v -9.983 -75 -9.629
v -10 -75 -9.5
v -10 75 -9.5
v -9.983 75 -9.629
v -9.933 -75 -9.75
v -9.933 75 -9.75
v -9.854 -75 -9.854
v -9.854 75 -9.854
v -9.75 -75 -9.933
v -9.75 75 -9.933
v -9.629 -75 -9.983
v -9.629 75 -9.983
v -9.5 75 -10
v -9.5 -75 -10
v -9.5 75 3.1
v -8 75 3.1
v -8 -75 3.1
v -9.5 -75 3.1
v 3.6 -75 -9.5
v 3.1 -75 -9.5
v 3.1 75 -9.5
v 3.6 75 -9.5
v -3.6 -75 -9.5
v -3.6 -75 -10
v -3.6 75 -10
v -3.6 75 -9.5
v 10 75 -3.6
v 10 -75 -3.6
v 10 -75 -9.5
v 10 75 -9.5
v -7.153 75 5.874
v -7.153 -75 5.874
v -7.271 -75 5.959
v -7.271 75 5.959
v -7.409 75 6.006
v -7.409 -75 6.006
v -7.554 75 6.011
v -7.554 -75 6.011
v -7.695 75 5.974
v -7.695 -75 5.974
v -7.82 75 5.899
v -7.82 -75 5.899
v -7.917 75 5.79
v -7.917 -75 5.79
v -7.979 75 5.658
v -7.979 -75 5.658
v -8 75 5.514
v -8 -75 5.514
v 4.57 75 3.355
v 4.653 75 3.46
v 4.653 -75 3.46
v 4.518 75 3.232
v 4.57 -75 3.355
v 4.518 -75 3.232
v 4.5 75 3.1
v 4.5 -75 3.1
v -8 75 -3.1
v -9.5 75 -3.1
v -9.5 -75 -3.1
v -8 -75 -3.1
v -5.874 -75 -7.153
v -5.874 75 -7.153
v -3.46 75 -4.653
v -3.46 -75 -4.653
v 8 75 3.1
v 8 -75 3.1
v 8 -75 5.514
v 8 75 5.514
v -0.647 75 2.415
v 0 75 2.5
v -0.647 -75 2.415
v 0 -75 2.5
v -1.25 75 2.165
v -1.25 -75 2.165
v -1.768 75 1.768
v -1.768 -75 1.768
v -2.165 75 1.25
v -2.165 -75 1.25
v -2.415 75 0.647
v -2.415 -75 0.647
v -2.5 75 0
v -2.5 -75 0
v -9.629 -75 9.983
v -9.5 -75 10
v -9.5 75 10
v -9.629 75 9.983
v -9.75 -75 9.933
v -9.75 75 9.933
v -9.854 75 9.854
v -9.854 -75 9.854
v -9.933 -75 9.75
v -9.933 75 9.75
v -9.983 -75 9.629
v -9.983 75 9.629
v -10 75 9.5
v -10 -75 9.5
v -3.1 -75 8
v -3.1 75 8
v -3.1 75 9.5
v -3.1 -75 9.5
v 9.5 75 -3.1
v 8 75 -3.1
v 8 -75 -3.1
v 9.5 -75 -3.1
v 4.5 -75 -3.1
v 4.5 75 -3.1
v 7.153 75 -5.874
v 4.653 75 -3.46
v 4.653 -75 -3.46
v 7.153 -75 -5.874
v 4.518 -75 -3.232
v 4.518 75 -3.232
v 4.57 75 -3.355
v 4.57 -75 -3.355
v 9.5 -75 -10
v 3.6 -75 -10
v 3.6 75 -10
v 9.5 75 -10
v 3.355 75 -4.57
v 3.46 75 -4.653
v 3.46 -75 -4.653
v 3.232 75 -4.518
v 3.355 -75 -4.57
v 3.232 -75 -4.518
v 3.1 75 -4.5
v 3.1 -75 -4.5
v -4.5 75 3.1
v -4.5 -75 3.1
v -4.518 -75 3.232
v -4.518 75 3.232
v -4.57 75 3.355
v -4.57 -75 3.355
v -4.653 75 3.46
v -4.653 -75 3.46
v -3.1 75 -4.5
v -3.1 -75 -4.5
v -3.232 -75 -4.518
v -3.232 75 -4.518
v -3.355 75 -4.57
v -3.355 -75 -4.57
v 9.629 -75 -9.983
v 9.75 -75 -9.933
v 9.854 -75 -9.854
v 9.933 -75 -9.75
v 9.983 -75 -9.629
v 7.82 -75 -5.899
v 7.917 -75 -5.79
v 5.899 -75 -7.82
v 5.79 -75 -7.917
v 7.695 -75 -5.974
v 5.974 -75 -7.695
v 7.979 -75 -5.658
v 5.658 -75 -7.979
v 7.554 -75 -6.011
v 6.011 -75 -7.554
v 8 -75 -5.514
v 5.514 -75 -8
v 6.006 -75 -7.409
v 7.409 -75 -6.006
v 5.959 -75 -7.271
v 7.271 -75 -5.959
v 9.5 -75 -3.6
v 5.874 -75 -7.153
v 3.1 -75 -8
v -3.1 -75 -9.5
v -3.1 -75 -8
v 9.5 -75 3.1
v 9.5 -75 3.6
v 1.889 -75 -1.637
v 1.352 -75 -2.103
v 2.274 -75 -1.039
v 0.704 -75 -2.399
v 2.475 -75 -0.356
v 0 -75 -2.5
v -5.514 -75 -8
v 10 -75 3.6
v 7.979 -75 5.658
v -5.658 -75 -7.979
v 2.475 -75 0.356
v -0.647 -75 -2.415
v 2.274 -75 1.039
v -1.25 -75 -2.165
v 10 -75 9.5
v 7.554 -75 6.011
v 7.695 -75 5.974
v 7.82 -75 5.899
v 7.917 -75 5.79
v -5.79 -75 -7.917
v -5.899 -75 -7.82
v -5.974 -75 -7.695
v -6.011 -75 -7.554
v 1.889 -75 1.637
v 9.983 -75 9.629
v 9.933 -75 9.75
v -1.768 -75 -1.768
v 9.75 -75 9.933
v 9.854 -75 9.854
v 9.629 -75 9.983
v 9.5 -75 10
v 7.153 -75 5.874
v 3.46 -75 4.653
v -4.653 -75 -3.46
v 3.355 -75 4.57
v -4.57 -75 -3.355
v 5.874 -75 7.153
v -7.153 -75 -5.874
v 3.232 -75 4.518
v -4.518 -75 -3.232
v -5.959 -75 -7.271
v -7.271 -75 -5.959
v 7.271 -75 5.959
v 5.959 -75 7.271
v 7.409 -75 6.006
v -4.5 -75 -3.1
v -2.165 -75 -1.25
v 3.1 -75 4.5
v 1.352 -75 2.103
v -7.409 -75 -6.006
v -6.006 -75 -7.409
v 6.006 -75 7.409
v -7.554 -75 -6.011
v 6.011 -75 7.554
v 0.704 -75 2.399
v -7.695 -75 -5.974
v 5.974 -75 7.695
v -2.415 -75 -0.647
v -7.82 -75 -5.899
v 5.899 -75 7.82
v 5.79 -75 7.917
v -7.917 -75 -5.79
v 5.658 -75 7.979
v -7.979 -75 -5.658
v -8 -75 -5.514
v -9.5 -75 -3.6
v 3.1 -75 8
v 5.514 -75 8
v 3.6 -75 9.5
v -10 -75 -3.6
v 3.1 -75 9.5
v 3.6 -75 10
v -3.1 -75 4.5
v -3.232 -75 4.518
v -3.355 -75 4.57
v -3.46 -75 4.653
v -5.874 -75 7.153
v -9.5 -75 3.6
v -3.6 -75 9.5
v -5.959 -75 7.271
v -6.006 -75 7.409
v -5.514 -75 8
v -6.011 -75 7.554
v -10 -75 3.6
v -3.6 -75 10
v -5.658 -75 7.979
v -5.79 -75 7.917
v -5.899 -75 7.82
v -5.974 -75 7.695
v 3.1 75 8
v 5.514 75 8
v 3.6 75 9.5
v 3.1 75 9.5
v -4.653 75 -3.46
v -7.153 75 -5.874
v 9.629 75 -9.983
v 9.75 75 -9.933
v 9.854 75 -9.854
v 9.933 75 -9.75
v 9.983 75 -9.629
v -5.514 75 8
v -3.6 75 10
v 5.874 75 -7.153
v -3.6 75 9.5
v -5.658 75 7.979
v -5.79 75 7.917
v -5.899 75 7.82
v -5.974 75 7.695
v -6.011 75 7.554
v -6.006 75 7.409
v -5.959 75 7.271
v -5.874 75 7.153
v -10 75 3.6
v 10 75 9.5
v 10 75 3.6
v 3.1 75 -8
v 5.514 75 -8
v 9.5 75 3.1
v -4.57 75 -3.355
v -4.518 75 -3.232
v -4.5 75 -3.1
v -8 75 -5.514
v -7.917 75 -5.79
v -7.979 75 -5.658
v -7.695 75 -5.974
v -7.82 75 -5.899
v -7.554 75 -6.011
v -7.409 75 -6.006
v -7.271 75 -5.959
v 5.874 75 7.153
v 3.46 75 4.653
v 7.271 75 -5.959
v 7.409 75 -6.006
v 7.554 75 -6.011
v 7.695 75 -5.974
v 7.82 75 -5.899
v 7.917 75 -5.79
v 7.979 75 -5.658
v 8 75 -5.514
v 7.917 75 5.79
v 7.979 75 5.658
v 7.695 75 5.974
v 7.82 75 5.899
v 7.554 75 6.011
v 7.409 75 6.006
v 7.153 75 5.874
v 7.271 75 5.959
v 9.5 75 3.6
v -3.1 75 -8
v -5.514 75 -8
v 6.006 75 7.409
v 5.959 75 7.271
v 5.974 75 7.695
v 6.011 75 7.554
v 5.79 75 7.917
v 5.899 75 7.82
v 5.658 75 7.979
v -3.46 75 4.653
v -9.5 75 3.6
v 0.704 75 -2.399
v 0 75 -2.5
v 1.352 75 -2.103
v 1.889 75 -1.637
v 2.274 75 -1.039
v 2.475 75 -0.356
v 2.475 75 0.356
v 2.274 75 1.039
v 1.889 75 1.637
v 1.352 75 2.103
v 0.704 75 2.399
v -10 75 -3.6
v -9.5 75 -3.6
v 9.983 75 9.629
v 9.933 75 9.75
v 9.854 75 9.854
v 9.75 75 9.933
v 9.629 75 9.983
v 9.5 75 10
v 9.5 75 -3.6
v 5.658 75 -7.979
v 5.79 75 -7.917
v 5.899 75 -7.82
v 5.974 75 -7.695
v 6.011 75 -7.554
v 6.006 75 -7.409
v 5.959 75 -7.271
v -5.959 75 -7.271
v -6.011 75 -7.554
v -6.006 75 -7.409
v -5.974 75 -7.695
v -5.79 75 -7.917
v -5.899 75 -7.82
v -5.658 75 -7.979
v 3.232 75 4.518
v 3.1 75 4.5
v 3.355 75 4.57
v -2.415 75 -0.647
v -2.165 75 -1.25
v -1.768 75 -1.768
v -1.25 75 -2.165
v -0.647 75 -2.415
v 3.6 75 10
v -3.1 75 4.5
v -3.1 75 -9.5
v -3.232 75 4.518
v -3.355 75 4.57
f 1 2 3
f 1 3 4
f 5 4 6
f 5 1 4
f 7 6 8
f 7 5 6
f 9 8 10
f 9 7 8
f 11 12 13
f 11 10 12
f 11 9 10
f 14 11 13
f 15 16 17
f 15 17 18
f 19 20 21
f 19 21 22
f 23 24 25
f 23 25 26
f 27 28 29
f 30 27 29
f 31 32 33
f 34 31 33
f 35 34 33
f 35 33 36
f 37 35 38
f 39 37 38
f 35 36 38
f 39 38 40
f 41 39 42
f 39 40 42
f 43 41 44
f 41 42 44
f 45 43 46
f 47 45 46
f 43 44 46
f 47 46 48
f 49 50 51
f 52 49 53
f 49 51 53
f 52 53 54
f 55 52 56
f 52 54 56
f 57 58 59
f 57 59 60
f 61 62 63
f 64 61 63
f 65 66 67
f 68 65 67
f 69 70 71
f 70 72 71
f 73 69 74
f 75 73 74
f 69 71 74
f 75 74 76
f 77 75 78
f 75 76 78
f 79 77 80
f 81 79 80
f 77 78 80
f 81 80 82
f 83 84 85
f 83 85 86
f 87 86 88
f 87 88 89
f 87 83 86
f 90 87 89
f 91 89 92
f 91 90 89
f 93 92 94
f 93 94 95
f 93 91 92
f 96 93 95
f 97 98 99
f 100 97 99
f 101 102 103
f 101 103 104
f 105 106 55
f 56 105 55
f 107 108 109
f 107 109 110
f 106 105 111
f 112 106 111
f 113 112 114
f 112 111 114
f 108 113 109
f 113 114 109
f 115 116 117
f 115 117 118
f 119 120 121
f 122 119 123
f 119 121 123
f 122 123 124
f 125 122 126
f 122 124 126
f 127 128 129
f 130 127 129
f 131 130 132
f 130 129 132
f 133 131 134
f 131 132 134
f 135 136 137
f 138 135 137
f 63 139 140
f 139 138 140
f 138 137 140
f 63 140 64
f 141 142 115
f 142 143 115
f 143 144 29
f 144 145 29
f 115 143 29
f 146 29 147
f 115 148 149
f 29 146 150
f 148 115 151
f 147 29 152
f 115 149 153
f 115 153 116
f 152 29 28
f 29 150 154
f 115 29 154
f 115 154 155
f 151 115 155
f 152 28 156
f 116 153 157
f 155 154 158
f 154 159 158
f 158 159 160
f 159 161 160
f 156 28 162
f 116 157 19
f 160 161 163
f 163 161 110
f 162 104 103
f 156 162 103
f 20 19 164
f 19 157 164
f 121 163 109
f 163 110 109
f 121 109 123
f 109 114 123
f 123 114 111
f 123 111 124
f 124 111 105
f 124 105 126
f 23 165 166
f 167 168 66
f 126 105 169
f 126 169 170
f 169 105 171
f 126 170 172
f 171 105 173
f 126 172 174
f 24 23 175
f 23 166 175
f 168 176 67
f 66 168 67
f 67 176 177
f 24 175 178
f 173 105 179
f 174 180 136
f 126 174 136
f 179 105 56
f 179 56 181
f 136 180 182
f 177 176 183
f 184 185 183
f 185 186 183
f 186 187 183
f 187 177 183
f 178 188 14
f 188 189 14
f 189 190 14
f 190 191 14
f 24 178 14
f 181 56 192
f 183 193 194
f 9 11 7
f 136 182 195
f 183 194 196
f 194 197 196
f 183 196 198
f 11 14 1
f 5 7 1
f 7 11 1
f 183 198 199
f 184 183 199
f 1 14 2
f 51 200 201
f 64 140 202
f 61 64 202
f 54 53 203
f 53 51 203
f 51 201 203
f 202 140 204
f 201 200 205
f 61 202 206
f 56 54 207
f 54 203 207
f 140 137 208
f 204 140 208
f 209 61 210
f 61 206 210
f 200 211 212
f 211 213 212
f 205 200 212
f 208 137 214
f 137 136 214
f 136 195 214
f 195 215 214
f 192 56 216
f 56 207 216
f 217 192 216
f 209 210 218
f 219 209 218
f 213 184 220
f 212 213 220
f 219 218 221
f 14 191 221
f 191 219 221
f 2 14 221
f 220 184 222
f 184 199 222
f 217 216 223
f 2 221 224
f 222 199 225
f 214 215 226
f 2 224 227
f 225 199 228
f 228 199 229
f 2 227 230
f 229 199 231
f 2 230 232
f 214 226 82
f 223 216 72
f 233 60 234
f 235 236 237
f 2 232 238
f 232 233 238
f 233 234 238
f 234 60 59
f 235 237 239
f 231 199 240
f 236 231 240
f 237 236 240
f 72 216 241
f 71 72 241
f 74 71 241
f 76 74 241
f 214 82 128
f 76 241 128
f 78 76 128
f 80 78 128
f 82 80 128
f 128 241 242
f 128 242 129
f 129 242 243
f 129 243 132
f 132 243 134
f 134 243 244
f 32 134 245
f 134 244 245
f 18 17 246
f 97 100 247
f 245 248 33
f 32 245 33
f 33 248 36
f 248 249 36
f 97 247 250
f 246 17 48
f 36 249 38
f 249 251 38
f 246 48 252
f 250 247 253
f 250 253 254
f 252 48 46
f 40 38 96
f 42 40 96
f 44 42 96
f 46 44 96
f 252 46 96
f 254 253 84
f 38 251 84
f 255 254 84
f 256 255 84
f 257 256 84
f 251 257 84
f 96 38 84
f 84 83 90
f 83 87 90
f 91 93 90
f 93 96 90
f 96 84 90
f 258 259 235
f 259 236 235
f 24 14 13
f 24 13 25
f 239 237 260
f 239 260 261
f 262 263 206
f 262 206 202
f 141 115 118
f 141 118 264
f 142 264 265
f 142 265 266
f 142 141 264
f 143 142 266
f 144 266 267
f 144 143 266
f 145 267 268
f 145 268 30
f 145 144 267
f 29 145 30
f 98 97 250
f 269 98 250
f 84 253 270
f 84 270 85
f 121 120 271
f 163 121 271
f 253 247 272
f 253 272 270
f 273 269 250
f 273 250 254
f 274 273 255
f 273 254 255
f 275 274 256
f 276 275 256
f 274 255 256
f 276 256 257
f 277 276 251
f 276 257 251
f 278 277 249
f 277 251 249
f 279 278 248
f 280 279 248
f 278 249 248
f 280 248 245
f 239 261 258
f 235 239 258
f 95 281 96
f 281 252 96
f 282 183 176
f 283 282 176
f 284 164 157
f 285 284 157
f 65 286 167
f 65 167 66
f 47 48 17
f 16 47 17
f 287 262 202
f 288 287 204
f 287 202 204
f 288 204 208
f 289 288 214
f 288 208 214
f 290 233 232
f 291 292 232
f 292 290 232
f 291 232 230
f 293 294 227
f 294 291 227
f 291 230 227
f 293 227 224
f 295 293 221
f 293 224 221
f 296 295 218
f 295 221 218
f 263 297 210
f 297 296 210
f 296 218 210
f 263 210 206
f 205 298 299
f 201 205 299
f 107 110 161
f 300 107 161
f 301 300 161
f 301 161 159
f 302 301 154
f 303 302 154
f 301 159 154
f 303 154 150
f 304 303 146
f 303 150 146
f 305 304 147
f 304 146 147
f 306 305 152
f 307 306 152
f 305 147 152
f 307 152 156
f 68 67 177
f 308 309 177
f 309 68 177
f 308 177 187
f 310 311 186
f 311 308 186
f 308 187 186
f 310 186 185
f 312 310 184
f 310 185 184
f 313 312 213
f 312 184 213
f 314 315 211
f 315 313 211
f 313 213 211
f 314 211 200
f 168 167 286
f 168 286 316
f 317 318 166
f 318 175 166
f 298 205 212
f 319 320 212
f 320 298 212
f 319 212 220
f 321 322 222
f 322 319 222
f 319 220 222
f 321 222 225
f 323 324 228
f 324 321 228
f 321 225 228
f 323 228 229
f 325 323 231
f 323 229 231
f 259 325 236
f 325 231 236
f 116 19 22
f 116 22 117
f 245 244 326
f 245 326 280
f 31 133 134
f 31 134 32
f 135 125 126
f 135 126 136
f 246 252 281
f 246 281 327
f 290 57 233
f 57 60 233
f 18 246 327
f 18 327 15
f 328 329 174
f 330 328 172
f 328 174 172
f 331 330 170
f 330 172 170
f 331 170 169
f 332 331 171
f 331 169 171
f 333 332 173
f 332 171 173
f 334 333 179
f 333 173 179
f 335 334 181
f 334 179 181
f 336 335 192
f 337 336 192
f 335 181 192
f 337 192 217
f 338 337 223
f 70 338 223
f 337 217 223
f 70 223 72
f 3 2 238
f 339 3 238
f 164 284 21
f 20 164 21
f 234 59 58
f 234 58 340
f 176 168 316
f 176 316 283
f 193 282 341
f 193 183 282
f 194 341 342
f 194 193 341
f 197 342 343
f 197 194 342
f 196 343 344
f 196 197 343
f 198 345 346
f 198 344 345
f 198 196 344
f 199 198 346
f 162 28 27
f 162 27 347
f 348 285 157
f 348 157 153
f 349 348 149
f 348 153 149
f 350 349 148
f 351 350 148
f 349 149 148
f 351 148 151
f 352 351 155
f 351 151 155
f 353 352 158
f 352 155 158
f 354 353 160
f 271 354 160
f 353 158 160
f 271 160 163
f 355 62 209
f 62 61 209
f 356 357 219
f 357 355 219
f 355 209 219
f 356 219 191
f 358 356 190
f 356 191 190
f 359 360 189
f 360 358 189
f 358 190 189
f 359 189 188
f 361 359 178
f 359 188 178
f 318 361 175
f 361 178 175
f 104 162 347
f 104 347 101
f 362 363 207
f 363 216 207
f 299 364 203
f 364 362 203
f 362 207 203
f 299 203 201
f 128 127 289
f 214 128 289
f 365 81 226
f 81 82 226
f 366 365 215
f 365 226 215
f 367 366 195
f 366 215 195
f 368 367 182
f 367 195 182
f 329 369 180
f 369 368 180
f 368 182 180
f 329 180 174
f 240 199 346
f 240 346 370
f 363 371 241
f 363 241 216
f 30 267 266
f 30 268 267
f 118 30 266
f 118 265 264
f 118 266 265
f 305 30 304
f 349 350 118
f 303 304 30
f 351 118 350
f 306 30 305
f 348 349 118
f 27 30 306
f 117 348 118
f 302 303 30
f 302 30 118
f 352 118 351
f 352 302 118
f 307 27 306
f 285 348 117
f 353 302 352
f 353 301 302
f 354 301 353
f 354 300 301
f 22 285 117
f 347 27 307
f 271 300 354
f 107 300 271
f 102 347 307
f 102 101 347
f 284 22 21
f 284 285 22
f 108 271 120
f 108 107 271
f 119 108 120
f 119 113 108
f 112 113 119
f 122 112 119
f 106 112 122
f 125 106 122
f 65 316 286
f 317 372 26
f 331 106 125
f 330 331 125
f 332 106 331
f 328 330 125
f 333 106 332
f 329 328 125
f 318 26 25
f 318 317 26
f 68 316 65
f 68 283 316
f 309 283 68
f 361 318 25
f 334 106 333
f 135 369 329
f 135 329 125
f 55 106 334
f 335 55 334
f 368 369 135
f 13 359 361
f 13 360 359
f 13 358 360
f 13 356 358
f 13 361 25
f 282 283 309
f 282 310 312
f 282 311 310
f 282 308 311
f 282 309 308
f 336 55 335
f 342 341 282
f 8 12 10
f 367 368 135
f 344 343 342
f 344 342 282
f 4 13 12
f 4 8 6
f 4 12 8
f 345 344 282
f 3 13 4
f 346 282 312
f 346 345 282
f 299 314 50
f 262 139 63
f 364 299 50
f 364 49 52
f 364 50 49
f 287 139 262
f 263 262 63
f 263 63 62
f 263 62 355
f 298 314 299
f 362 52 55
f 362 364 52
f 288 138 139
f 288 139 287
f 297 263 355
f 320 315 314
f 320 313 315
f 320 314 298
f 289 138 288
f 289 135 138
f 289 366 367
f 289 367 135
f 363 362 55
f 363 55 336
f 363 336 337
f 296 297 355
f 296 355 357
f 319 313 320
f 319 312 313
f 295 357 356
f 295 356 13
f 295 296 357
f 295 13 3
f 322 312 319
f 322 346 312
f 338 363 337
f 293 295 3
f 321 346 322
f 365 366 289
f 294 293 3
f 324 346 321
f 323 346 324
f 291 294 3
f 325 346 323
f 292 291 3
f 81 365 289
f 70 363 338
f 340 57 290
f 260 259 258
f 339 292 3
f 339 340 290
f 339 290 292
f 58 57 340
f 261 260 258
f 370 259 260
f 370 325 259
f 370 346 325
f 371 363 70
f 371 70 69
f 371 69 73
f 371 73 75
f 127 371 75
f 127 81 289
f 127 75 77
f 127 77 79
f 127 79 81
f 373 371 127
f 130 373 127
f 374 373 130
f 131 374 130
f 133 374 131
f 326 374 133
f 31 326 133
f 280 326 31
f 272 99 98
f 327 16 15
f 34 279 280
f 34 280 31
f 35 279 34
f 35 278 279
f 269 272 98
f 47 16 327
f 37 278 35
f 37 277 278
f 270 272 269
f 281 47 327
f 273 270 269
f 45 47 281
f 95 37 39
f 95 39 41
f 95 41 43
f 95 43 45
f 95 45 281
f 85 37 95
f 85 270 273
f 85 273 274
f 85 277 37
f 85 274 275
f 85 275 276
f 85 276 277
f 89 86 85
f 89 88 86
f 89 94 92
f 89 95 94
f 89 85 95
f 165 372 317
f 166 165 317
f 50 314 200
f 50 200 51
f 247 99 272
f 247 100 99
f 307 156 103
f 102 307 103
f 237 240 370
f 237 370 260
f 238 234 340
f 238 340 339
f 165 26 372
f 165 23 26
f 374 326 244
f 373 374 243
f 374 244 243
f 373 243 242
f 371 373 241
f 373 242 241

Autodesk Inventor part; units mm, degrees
ref_plane "YZ Plane" through (0, 0, 0) normal (1, 0, 0) x (0, 1, 0)
ref_plane "XZ Plane" through (0, 0, 0) normal (0, 1, 0) x (-1, 0, 0)
ref_plane "XY Plane" through (0, 0, 0) normal (0, 0, 1) x (1, 0, 0)
sketch "Esboço1" plane through (0, 0, 0) normal (0, 1, 0) x (-1, 0, 0)
  line L0 (-10, 10) -> (10, 10) construction
  line L1 (10, 10) -> (10, -10) construction
  line L2 (10, -10) -> (-10, -10) construction
  line L3 (-10, -10) -> (-10, 10) construction
  line L4 (-10, 10) -> (10, -10) construction
  line L5 (10, 10) -> (-10, -10) construction
  line L6 (0, -4.5) -> (3.1, -4.5)
  line L7 (0, -10) -> (0, 10) construction
  line L8 (5.8739, -7.1527) -> (3.4597, -4.6527)
  arc A0 (3.4597, -4.6527) -> (3.1, -4.5) centre (3.1, -5) ccw
  line L9 (5.5142, -8) -> (3.1, -8)
  arc A1 (5.5142, -8) -> (5.8739, -7.1527) centre (5.5142, -7.5) ccw
  line L10 (3.1, -9.5) -> (3.1, -8)
  line L11 (3.6, -9.5) -> (3.1, -9.5)
  line L12 (3.6, -10) -> (3.6, -9.5)
  line L13 (10, -10) -> (3.6, -10) construction
  line L14 (10, -10) -> (0, -10) construction
  line L15 (10, -10) -> (10, -3.6) construction
  line L16 (9.5, -3.1) -> (8, -3.1)
  line L17 (9.5, -3.1) -> (9.5, -3.6)
  line L18 (9.5, -3.6) -> (10, -3.6)
  line L19 (8, -3.1) -> (8, -5.5142)
  line L20 (7.1527, -5.8739) -> (4.6527, -3.4597)
  line L21 (4.5, 0) -> (4.5, -3.1)
  arc A2 (4.5, -3.1) -> (4.6527, -3.4597) centre (5, -3.1) ccw
  line L22 (10, 0) -> (0, 0) construction
  line L23 (4.5, 0) -> (2.5, 0)
  line L24 (0, -4.5) -> (0, -2.5)
  arc A3 (7.1527, -5.8739) -> (8, -5.5142) centre (7.5, -5.5142) ccw
  arc A4 (0, -2.5) -> (2.5, 0) centre (0, 0) ccw
  arc A5 (9.5, -10) -> (10, -9.5) centre (9.5, -9.5) ccw
  line L25 (9.5, -10) -> (3.6, -10)
  line L26 (10, -9.5) -> (10, -3.6)
  point P0 (3.5, 0)
  dimension "d0" = 20
  dimension "d5" = 0.5
  dimension "d6" = 1
  dimension "d7" = 0.5
  dimension "d8" = 2
  dimension "d10" = 6.9
  dimension "d12" = 3.1
  dimension "d15" = 2.5
  dimension "d16" = 2
extrude "Extrusão1" add sketch "Esboço1" along normal mid plane 150
mirror "Espelhar1" about plane through (0, 0, 0) normal (1, 0, 0) of "Extrusão1"
mirror "Espelhar2" about plane through (0, 0, 0) normal (0, 0, 1) of "Extrusão1", "Espelhar1"
equation "\"Raio_vergadura\" = Espessura"
equation "\"Largura_alívio_de_vergadura\" = Espessura"
equation "\"Profundidade_alívio_de_vergadura\" = 0.5 * Espessura"
equation "\"Tamanho_alívio_de_dobra\" = 4 * Espessura"
equation "\"Remanescente_mínimo\" = 2 * Espessura"
equation "\"Raiodetransição\" = Raio_vergadura"
equation "\"Tamanho_de_raio_de_Jacobi\" = Raio_vergadura"
equation "\"TamanhoFolga\" = Espessura"
equation "\"Espessura\" = 0.5"
